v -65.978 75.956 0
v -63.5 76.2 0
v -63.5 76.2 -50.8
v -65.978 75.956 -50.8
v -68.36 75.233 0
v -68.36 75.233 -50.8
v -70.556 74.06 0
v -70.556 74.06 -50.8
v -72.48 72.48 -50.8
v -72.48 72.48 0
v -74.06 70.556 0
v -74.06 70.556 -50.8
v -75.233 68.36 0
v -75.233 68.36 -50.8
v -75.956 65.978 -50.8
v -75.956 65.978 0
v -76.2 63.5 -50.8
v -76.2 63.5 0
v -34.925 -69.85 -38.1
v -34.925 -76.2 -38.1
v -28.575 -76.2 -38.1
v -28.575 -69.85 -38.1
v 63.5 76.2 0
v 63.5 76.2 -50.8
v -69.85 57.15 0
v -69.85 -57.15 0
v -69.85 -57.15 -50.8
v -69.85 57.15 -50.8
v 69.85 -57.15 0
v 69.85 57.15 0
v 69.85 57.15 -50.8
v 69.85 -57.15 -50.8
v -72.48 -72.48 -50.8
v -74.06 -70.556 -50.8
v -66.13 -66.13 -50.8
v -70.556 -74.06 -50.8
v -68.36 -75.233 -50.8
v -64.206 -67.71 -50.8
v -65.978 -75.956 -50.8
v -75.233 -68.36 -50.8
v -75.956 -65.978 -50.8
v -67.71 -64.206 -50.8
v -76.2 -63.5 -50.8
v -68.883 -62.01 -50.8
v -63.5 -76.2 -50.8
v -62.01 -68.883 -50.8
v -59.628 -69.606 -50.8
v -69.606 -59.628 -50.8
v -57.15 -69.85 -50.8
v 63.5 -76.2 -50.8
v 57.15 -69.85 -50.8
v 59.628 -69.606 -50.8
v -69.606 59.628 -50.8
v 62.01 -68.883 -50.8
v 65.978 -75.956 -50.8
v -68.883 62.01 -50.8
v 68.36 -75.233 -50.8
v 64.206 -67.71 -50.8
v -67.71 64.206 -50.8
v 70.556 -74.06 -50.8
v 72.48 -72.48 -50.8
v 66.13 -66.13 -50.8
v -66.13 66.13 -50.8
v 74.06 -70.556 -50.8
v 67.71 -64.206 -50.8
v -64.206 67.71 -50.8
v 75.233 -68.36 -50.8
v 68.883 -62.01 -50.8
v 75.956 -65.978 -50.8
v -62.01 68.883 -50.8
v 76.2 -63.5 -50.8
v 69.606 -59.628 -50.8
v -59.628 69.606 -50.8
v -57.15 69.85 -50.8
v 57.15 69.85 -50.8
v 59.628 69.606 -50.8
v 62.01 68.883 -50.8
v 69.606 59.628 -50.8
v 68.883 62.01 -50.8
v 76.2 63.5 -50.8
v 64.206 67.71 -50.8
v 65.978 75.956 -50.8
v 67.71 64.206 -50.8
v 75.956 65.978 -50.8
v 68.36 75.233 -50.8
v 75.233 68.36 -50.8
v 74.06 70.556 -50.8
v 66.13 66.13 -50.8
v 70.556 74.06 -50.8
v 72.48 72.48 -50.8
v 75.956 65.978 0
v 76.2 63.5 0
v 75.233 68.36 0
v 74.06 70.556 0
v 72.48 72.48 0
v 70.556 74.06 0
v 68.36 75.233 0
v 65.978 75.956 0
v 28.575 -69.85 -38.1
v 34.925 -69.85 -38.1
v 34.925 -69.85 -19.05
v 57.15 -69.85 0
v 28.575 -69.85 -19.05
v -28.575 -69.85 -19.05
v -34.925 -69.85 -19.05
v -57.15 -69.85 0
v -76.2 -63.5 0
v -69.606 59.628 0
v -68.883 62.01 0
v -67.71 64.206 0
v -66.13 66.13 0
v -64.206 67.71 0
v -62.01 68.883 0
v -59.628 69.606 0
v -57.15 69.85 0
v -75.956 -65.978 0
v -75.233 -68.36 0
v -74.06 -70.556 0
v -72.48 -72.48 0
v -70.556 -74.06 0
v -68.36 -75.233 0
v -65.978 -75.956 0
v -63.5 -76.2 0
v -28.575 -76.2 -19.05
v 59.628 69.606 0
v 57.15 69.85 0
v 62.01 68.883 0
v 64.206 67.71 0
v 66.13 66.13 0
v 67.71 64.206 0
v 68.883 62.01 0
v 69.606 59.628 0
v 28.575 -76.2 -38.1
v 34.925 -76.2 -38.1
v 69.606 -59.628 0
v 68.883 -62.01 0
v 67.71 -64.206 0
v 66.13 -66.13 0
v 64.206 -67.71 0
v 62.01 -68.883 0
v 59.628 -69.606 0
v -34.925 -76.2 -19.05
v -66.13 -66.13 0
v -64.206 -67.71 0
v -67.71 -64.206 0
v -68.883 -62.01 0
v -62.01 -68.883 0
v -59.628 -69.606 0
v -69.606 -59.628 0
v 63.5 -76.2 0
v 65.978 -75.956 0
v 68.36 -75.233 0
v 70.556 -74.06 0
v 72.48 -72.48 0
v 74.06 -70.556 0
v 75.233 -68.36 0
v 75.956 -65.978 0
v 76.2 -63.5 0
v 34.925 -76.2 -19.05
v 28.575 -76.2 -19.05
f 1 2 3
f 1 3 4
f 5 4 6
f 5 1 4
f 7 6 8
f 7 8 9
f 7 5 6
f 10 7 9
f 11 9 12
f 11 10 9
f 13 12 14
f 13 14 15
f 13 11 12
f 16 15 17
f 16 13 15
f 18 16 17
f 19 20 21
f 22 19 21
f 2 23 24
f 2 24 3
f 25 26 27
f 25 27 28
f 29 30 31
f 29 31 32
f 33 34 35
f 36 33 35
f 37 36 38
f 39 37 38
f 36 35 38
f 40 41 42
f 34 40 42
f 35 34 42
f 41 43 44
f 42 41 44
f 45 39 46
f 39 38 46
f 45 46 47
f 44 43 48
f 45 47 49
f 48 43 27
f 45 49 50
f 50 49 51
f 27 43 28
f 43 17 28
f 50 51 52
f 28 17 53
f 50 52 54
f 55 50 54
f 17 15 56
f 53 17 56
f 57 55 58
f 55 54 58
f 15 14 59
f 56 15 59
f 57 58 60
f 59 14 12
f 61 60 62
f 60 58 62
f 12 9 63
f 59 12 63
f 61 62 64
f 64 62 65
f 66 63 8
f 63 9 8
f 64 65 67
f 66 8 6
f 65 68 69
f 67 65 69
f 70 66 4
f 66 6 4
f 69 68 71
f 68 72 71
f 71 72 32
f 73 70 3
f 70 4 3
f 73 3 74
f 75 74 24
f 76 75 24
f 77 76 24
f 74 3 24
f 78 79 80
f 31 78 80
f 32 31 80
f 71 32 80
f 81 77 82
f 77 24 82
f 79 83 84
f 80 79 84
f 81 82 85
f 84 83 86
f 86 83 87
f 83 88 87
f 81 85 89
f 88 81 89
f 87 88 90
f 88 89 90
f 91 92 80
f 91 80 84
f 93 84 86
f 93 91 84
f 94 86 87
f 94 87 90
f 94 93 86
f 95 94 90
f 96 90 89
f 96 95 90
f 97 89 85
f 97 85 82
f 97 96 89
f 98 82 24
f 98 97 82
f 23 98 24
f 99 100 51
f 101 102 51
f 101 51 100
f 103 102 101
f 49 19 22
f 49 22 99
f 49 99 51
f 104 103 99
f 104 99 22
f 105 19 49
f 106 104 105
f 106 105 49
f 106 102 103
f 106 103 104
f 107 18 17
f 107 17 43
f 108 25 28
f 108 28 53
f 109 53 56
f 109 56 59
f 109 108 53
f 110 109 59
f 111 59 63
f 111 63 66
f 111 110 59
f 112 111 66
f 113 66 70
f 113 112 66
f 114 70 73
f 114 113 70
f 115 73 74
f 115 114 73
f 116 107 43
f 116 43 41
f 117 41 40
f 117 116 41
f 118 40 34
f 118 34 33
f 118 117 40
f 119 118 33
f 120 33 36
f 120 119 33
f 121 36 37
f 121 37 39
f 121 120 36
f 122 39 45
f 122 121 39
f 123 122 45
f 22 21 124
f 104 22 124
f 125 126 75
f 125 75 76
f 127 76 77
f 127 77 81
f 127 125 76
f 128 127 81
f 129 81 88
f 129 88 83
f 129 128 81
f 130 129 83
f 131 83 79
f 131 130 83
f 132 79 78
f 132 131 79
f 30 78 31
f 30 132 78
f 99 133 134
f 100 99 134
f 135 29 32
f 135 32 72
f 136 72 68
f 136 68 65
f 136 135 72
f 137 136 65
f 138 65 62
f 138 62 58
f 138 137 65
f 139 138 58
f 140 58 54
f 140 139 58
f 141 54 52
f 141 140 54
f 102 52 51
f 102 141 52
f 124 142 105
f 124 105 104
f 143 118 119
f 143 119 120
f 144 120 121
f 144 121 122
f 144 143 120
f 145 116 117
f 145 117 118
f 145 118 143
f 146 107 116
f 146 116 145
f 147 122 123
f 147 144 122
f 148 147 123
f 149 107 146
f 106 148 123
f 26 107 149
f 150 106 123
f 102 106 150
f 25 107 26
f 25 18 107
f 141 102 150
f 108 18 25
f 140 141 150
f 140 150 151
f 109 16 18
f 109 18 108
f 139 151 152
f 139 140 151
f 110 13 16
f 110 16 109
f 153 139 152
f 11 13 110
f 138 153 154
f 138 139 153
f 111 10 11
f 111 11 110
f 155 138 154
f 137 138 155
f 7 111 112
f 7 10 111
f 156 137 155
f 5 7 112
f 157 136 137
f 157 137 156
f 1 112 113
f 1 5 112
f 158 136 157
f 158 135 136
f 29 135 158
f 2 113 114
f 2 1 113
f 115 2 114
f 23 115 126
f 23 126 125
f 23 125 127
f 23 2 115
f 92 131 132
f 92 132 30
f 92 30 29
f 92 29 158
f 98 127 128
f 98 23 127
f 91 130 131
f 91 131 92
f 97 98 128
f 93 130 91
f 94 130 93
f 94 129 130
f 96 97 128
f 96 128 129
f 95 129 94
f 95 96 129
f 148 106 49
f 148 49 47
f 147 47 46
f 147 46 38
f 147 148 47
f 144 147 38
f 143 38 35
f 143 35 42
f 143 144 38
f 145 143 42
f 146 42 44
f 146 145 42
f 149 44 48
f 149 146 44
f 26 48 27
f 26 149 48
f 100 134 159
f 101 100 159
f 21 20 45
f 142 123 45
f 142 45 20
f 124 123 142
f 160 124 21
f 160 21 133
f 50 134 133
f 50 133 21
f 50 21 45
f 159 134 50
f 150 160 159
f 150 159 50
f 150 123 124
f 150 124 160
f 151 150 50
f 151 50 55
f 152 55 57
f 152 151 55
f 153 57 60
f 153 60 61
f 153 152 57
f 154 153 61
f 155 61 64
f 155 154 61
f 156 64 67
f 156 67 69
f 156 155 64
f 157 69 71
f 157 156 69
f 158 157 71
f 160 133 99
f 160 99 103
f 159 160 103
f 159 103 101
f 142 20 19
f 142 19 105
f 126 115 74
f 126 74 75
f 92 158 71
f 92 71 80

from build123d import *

# Parameters (mm, degrees)
F1_DEPTH = 50.8
F2_W     = 6.35
F2_H     = 19.05
F3_DEPTH = 6.35


with BuildPart() as f1:
    # F0 (on Top) → F1 (new body)
    with BuildSketch(Plane.XY):
        with BuildLine():
            Line((63.5, 76.2), (-63.5, 76.2))
            ThreePointArc((-63.5, 76.2), (-72.480256, 72.480256), (-76.2, 63.5))
            Line((-76.2, 63.5), (-76.2, -63.5))
            ThreePointArc((-76.2, -63.5), (-72.480256, -72.480256), (-63.5, -76.2))
            Line((-63.5, -76.2), (63.5, -76.2))
            ThreePointArc((63.5, -76.2), (72.480256, -72.480256), (76.2, -63.5))
            Line((76.2, -63.5), (76.2, 63.5))
            ThreePointArc((76.2, 63.5), (72.480256, 72.480256), (63.5, 76.2))
        make_face()
        with BuildLine():
            ThreePointArc((-69.85, 57.15), (-66.130256, 66.130256), (-57.15, 69.85))
            Line((-57.15, 69.85), (0, 69.85))
            Line((0, 69.85), (57.15, 69.85))
            ThreePointArc((57.15, 69.85), (66.130256, 66.130256), (69.85, 57.15))
            Line((69.85, 57.15), (69.85, 0))
            Line((69.85, 0), (69.85, -57.15))
            ThreePointArc((69.85, -57.15), (66.130256, -66.130256), (57.15, -69.85))
            Line((57.15, -69.85), (0, -69.85))
            Line((0, -69.85), (-57.15, -69.85))
            ThreePointArc((-57.15, -69.85), (-66.130256, -66.130256), (-69.85, -57.15))
            Line((-69.85, -57.15), (-69.85, 0))
            Line((-69.85, 0), (-69.85, 57.15))
        make_face(mode=Mode.SUBTRACT)
    extrude(amount=-F1_DEPTH)

    # F2 (on face) → F3 (cut)
    with BuildSketch(Plane.XZ.offset(76.2)):
        with Locations((-31.75, -28.575)):
            Rectangle(F2_W, F2_H)
        with Locations((31.75, -28.575)):
            Rectangle(F2_W, F2_H)
    extrude(amount=-F3_DEPTH, mode=Mode.SUBTRACT)


solid = f1.part
